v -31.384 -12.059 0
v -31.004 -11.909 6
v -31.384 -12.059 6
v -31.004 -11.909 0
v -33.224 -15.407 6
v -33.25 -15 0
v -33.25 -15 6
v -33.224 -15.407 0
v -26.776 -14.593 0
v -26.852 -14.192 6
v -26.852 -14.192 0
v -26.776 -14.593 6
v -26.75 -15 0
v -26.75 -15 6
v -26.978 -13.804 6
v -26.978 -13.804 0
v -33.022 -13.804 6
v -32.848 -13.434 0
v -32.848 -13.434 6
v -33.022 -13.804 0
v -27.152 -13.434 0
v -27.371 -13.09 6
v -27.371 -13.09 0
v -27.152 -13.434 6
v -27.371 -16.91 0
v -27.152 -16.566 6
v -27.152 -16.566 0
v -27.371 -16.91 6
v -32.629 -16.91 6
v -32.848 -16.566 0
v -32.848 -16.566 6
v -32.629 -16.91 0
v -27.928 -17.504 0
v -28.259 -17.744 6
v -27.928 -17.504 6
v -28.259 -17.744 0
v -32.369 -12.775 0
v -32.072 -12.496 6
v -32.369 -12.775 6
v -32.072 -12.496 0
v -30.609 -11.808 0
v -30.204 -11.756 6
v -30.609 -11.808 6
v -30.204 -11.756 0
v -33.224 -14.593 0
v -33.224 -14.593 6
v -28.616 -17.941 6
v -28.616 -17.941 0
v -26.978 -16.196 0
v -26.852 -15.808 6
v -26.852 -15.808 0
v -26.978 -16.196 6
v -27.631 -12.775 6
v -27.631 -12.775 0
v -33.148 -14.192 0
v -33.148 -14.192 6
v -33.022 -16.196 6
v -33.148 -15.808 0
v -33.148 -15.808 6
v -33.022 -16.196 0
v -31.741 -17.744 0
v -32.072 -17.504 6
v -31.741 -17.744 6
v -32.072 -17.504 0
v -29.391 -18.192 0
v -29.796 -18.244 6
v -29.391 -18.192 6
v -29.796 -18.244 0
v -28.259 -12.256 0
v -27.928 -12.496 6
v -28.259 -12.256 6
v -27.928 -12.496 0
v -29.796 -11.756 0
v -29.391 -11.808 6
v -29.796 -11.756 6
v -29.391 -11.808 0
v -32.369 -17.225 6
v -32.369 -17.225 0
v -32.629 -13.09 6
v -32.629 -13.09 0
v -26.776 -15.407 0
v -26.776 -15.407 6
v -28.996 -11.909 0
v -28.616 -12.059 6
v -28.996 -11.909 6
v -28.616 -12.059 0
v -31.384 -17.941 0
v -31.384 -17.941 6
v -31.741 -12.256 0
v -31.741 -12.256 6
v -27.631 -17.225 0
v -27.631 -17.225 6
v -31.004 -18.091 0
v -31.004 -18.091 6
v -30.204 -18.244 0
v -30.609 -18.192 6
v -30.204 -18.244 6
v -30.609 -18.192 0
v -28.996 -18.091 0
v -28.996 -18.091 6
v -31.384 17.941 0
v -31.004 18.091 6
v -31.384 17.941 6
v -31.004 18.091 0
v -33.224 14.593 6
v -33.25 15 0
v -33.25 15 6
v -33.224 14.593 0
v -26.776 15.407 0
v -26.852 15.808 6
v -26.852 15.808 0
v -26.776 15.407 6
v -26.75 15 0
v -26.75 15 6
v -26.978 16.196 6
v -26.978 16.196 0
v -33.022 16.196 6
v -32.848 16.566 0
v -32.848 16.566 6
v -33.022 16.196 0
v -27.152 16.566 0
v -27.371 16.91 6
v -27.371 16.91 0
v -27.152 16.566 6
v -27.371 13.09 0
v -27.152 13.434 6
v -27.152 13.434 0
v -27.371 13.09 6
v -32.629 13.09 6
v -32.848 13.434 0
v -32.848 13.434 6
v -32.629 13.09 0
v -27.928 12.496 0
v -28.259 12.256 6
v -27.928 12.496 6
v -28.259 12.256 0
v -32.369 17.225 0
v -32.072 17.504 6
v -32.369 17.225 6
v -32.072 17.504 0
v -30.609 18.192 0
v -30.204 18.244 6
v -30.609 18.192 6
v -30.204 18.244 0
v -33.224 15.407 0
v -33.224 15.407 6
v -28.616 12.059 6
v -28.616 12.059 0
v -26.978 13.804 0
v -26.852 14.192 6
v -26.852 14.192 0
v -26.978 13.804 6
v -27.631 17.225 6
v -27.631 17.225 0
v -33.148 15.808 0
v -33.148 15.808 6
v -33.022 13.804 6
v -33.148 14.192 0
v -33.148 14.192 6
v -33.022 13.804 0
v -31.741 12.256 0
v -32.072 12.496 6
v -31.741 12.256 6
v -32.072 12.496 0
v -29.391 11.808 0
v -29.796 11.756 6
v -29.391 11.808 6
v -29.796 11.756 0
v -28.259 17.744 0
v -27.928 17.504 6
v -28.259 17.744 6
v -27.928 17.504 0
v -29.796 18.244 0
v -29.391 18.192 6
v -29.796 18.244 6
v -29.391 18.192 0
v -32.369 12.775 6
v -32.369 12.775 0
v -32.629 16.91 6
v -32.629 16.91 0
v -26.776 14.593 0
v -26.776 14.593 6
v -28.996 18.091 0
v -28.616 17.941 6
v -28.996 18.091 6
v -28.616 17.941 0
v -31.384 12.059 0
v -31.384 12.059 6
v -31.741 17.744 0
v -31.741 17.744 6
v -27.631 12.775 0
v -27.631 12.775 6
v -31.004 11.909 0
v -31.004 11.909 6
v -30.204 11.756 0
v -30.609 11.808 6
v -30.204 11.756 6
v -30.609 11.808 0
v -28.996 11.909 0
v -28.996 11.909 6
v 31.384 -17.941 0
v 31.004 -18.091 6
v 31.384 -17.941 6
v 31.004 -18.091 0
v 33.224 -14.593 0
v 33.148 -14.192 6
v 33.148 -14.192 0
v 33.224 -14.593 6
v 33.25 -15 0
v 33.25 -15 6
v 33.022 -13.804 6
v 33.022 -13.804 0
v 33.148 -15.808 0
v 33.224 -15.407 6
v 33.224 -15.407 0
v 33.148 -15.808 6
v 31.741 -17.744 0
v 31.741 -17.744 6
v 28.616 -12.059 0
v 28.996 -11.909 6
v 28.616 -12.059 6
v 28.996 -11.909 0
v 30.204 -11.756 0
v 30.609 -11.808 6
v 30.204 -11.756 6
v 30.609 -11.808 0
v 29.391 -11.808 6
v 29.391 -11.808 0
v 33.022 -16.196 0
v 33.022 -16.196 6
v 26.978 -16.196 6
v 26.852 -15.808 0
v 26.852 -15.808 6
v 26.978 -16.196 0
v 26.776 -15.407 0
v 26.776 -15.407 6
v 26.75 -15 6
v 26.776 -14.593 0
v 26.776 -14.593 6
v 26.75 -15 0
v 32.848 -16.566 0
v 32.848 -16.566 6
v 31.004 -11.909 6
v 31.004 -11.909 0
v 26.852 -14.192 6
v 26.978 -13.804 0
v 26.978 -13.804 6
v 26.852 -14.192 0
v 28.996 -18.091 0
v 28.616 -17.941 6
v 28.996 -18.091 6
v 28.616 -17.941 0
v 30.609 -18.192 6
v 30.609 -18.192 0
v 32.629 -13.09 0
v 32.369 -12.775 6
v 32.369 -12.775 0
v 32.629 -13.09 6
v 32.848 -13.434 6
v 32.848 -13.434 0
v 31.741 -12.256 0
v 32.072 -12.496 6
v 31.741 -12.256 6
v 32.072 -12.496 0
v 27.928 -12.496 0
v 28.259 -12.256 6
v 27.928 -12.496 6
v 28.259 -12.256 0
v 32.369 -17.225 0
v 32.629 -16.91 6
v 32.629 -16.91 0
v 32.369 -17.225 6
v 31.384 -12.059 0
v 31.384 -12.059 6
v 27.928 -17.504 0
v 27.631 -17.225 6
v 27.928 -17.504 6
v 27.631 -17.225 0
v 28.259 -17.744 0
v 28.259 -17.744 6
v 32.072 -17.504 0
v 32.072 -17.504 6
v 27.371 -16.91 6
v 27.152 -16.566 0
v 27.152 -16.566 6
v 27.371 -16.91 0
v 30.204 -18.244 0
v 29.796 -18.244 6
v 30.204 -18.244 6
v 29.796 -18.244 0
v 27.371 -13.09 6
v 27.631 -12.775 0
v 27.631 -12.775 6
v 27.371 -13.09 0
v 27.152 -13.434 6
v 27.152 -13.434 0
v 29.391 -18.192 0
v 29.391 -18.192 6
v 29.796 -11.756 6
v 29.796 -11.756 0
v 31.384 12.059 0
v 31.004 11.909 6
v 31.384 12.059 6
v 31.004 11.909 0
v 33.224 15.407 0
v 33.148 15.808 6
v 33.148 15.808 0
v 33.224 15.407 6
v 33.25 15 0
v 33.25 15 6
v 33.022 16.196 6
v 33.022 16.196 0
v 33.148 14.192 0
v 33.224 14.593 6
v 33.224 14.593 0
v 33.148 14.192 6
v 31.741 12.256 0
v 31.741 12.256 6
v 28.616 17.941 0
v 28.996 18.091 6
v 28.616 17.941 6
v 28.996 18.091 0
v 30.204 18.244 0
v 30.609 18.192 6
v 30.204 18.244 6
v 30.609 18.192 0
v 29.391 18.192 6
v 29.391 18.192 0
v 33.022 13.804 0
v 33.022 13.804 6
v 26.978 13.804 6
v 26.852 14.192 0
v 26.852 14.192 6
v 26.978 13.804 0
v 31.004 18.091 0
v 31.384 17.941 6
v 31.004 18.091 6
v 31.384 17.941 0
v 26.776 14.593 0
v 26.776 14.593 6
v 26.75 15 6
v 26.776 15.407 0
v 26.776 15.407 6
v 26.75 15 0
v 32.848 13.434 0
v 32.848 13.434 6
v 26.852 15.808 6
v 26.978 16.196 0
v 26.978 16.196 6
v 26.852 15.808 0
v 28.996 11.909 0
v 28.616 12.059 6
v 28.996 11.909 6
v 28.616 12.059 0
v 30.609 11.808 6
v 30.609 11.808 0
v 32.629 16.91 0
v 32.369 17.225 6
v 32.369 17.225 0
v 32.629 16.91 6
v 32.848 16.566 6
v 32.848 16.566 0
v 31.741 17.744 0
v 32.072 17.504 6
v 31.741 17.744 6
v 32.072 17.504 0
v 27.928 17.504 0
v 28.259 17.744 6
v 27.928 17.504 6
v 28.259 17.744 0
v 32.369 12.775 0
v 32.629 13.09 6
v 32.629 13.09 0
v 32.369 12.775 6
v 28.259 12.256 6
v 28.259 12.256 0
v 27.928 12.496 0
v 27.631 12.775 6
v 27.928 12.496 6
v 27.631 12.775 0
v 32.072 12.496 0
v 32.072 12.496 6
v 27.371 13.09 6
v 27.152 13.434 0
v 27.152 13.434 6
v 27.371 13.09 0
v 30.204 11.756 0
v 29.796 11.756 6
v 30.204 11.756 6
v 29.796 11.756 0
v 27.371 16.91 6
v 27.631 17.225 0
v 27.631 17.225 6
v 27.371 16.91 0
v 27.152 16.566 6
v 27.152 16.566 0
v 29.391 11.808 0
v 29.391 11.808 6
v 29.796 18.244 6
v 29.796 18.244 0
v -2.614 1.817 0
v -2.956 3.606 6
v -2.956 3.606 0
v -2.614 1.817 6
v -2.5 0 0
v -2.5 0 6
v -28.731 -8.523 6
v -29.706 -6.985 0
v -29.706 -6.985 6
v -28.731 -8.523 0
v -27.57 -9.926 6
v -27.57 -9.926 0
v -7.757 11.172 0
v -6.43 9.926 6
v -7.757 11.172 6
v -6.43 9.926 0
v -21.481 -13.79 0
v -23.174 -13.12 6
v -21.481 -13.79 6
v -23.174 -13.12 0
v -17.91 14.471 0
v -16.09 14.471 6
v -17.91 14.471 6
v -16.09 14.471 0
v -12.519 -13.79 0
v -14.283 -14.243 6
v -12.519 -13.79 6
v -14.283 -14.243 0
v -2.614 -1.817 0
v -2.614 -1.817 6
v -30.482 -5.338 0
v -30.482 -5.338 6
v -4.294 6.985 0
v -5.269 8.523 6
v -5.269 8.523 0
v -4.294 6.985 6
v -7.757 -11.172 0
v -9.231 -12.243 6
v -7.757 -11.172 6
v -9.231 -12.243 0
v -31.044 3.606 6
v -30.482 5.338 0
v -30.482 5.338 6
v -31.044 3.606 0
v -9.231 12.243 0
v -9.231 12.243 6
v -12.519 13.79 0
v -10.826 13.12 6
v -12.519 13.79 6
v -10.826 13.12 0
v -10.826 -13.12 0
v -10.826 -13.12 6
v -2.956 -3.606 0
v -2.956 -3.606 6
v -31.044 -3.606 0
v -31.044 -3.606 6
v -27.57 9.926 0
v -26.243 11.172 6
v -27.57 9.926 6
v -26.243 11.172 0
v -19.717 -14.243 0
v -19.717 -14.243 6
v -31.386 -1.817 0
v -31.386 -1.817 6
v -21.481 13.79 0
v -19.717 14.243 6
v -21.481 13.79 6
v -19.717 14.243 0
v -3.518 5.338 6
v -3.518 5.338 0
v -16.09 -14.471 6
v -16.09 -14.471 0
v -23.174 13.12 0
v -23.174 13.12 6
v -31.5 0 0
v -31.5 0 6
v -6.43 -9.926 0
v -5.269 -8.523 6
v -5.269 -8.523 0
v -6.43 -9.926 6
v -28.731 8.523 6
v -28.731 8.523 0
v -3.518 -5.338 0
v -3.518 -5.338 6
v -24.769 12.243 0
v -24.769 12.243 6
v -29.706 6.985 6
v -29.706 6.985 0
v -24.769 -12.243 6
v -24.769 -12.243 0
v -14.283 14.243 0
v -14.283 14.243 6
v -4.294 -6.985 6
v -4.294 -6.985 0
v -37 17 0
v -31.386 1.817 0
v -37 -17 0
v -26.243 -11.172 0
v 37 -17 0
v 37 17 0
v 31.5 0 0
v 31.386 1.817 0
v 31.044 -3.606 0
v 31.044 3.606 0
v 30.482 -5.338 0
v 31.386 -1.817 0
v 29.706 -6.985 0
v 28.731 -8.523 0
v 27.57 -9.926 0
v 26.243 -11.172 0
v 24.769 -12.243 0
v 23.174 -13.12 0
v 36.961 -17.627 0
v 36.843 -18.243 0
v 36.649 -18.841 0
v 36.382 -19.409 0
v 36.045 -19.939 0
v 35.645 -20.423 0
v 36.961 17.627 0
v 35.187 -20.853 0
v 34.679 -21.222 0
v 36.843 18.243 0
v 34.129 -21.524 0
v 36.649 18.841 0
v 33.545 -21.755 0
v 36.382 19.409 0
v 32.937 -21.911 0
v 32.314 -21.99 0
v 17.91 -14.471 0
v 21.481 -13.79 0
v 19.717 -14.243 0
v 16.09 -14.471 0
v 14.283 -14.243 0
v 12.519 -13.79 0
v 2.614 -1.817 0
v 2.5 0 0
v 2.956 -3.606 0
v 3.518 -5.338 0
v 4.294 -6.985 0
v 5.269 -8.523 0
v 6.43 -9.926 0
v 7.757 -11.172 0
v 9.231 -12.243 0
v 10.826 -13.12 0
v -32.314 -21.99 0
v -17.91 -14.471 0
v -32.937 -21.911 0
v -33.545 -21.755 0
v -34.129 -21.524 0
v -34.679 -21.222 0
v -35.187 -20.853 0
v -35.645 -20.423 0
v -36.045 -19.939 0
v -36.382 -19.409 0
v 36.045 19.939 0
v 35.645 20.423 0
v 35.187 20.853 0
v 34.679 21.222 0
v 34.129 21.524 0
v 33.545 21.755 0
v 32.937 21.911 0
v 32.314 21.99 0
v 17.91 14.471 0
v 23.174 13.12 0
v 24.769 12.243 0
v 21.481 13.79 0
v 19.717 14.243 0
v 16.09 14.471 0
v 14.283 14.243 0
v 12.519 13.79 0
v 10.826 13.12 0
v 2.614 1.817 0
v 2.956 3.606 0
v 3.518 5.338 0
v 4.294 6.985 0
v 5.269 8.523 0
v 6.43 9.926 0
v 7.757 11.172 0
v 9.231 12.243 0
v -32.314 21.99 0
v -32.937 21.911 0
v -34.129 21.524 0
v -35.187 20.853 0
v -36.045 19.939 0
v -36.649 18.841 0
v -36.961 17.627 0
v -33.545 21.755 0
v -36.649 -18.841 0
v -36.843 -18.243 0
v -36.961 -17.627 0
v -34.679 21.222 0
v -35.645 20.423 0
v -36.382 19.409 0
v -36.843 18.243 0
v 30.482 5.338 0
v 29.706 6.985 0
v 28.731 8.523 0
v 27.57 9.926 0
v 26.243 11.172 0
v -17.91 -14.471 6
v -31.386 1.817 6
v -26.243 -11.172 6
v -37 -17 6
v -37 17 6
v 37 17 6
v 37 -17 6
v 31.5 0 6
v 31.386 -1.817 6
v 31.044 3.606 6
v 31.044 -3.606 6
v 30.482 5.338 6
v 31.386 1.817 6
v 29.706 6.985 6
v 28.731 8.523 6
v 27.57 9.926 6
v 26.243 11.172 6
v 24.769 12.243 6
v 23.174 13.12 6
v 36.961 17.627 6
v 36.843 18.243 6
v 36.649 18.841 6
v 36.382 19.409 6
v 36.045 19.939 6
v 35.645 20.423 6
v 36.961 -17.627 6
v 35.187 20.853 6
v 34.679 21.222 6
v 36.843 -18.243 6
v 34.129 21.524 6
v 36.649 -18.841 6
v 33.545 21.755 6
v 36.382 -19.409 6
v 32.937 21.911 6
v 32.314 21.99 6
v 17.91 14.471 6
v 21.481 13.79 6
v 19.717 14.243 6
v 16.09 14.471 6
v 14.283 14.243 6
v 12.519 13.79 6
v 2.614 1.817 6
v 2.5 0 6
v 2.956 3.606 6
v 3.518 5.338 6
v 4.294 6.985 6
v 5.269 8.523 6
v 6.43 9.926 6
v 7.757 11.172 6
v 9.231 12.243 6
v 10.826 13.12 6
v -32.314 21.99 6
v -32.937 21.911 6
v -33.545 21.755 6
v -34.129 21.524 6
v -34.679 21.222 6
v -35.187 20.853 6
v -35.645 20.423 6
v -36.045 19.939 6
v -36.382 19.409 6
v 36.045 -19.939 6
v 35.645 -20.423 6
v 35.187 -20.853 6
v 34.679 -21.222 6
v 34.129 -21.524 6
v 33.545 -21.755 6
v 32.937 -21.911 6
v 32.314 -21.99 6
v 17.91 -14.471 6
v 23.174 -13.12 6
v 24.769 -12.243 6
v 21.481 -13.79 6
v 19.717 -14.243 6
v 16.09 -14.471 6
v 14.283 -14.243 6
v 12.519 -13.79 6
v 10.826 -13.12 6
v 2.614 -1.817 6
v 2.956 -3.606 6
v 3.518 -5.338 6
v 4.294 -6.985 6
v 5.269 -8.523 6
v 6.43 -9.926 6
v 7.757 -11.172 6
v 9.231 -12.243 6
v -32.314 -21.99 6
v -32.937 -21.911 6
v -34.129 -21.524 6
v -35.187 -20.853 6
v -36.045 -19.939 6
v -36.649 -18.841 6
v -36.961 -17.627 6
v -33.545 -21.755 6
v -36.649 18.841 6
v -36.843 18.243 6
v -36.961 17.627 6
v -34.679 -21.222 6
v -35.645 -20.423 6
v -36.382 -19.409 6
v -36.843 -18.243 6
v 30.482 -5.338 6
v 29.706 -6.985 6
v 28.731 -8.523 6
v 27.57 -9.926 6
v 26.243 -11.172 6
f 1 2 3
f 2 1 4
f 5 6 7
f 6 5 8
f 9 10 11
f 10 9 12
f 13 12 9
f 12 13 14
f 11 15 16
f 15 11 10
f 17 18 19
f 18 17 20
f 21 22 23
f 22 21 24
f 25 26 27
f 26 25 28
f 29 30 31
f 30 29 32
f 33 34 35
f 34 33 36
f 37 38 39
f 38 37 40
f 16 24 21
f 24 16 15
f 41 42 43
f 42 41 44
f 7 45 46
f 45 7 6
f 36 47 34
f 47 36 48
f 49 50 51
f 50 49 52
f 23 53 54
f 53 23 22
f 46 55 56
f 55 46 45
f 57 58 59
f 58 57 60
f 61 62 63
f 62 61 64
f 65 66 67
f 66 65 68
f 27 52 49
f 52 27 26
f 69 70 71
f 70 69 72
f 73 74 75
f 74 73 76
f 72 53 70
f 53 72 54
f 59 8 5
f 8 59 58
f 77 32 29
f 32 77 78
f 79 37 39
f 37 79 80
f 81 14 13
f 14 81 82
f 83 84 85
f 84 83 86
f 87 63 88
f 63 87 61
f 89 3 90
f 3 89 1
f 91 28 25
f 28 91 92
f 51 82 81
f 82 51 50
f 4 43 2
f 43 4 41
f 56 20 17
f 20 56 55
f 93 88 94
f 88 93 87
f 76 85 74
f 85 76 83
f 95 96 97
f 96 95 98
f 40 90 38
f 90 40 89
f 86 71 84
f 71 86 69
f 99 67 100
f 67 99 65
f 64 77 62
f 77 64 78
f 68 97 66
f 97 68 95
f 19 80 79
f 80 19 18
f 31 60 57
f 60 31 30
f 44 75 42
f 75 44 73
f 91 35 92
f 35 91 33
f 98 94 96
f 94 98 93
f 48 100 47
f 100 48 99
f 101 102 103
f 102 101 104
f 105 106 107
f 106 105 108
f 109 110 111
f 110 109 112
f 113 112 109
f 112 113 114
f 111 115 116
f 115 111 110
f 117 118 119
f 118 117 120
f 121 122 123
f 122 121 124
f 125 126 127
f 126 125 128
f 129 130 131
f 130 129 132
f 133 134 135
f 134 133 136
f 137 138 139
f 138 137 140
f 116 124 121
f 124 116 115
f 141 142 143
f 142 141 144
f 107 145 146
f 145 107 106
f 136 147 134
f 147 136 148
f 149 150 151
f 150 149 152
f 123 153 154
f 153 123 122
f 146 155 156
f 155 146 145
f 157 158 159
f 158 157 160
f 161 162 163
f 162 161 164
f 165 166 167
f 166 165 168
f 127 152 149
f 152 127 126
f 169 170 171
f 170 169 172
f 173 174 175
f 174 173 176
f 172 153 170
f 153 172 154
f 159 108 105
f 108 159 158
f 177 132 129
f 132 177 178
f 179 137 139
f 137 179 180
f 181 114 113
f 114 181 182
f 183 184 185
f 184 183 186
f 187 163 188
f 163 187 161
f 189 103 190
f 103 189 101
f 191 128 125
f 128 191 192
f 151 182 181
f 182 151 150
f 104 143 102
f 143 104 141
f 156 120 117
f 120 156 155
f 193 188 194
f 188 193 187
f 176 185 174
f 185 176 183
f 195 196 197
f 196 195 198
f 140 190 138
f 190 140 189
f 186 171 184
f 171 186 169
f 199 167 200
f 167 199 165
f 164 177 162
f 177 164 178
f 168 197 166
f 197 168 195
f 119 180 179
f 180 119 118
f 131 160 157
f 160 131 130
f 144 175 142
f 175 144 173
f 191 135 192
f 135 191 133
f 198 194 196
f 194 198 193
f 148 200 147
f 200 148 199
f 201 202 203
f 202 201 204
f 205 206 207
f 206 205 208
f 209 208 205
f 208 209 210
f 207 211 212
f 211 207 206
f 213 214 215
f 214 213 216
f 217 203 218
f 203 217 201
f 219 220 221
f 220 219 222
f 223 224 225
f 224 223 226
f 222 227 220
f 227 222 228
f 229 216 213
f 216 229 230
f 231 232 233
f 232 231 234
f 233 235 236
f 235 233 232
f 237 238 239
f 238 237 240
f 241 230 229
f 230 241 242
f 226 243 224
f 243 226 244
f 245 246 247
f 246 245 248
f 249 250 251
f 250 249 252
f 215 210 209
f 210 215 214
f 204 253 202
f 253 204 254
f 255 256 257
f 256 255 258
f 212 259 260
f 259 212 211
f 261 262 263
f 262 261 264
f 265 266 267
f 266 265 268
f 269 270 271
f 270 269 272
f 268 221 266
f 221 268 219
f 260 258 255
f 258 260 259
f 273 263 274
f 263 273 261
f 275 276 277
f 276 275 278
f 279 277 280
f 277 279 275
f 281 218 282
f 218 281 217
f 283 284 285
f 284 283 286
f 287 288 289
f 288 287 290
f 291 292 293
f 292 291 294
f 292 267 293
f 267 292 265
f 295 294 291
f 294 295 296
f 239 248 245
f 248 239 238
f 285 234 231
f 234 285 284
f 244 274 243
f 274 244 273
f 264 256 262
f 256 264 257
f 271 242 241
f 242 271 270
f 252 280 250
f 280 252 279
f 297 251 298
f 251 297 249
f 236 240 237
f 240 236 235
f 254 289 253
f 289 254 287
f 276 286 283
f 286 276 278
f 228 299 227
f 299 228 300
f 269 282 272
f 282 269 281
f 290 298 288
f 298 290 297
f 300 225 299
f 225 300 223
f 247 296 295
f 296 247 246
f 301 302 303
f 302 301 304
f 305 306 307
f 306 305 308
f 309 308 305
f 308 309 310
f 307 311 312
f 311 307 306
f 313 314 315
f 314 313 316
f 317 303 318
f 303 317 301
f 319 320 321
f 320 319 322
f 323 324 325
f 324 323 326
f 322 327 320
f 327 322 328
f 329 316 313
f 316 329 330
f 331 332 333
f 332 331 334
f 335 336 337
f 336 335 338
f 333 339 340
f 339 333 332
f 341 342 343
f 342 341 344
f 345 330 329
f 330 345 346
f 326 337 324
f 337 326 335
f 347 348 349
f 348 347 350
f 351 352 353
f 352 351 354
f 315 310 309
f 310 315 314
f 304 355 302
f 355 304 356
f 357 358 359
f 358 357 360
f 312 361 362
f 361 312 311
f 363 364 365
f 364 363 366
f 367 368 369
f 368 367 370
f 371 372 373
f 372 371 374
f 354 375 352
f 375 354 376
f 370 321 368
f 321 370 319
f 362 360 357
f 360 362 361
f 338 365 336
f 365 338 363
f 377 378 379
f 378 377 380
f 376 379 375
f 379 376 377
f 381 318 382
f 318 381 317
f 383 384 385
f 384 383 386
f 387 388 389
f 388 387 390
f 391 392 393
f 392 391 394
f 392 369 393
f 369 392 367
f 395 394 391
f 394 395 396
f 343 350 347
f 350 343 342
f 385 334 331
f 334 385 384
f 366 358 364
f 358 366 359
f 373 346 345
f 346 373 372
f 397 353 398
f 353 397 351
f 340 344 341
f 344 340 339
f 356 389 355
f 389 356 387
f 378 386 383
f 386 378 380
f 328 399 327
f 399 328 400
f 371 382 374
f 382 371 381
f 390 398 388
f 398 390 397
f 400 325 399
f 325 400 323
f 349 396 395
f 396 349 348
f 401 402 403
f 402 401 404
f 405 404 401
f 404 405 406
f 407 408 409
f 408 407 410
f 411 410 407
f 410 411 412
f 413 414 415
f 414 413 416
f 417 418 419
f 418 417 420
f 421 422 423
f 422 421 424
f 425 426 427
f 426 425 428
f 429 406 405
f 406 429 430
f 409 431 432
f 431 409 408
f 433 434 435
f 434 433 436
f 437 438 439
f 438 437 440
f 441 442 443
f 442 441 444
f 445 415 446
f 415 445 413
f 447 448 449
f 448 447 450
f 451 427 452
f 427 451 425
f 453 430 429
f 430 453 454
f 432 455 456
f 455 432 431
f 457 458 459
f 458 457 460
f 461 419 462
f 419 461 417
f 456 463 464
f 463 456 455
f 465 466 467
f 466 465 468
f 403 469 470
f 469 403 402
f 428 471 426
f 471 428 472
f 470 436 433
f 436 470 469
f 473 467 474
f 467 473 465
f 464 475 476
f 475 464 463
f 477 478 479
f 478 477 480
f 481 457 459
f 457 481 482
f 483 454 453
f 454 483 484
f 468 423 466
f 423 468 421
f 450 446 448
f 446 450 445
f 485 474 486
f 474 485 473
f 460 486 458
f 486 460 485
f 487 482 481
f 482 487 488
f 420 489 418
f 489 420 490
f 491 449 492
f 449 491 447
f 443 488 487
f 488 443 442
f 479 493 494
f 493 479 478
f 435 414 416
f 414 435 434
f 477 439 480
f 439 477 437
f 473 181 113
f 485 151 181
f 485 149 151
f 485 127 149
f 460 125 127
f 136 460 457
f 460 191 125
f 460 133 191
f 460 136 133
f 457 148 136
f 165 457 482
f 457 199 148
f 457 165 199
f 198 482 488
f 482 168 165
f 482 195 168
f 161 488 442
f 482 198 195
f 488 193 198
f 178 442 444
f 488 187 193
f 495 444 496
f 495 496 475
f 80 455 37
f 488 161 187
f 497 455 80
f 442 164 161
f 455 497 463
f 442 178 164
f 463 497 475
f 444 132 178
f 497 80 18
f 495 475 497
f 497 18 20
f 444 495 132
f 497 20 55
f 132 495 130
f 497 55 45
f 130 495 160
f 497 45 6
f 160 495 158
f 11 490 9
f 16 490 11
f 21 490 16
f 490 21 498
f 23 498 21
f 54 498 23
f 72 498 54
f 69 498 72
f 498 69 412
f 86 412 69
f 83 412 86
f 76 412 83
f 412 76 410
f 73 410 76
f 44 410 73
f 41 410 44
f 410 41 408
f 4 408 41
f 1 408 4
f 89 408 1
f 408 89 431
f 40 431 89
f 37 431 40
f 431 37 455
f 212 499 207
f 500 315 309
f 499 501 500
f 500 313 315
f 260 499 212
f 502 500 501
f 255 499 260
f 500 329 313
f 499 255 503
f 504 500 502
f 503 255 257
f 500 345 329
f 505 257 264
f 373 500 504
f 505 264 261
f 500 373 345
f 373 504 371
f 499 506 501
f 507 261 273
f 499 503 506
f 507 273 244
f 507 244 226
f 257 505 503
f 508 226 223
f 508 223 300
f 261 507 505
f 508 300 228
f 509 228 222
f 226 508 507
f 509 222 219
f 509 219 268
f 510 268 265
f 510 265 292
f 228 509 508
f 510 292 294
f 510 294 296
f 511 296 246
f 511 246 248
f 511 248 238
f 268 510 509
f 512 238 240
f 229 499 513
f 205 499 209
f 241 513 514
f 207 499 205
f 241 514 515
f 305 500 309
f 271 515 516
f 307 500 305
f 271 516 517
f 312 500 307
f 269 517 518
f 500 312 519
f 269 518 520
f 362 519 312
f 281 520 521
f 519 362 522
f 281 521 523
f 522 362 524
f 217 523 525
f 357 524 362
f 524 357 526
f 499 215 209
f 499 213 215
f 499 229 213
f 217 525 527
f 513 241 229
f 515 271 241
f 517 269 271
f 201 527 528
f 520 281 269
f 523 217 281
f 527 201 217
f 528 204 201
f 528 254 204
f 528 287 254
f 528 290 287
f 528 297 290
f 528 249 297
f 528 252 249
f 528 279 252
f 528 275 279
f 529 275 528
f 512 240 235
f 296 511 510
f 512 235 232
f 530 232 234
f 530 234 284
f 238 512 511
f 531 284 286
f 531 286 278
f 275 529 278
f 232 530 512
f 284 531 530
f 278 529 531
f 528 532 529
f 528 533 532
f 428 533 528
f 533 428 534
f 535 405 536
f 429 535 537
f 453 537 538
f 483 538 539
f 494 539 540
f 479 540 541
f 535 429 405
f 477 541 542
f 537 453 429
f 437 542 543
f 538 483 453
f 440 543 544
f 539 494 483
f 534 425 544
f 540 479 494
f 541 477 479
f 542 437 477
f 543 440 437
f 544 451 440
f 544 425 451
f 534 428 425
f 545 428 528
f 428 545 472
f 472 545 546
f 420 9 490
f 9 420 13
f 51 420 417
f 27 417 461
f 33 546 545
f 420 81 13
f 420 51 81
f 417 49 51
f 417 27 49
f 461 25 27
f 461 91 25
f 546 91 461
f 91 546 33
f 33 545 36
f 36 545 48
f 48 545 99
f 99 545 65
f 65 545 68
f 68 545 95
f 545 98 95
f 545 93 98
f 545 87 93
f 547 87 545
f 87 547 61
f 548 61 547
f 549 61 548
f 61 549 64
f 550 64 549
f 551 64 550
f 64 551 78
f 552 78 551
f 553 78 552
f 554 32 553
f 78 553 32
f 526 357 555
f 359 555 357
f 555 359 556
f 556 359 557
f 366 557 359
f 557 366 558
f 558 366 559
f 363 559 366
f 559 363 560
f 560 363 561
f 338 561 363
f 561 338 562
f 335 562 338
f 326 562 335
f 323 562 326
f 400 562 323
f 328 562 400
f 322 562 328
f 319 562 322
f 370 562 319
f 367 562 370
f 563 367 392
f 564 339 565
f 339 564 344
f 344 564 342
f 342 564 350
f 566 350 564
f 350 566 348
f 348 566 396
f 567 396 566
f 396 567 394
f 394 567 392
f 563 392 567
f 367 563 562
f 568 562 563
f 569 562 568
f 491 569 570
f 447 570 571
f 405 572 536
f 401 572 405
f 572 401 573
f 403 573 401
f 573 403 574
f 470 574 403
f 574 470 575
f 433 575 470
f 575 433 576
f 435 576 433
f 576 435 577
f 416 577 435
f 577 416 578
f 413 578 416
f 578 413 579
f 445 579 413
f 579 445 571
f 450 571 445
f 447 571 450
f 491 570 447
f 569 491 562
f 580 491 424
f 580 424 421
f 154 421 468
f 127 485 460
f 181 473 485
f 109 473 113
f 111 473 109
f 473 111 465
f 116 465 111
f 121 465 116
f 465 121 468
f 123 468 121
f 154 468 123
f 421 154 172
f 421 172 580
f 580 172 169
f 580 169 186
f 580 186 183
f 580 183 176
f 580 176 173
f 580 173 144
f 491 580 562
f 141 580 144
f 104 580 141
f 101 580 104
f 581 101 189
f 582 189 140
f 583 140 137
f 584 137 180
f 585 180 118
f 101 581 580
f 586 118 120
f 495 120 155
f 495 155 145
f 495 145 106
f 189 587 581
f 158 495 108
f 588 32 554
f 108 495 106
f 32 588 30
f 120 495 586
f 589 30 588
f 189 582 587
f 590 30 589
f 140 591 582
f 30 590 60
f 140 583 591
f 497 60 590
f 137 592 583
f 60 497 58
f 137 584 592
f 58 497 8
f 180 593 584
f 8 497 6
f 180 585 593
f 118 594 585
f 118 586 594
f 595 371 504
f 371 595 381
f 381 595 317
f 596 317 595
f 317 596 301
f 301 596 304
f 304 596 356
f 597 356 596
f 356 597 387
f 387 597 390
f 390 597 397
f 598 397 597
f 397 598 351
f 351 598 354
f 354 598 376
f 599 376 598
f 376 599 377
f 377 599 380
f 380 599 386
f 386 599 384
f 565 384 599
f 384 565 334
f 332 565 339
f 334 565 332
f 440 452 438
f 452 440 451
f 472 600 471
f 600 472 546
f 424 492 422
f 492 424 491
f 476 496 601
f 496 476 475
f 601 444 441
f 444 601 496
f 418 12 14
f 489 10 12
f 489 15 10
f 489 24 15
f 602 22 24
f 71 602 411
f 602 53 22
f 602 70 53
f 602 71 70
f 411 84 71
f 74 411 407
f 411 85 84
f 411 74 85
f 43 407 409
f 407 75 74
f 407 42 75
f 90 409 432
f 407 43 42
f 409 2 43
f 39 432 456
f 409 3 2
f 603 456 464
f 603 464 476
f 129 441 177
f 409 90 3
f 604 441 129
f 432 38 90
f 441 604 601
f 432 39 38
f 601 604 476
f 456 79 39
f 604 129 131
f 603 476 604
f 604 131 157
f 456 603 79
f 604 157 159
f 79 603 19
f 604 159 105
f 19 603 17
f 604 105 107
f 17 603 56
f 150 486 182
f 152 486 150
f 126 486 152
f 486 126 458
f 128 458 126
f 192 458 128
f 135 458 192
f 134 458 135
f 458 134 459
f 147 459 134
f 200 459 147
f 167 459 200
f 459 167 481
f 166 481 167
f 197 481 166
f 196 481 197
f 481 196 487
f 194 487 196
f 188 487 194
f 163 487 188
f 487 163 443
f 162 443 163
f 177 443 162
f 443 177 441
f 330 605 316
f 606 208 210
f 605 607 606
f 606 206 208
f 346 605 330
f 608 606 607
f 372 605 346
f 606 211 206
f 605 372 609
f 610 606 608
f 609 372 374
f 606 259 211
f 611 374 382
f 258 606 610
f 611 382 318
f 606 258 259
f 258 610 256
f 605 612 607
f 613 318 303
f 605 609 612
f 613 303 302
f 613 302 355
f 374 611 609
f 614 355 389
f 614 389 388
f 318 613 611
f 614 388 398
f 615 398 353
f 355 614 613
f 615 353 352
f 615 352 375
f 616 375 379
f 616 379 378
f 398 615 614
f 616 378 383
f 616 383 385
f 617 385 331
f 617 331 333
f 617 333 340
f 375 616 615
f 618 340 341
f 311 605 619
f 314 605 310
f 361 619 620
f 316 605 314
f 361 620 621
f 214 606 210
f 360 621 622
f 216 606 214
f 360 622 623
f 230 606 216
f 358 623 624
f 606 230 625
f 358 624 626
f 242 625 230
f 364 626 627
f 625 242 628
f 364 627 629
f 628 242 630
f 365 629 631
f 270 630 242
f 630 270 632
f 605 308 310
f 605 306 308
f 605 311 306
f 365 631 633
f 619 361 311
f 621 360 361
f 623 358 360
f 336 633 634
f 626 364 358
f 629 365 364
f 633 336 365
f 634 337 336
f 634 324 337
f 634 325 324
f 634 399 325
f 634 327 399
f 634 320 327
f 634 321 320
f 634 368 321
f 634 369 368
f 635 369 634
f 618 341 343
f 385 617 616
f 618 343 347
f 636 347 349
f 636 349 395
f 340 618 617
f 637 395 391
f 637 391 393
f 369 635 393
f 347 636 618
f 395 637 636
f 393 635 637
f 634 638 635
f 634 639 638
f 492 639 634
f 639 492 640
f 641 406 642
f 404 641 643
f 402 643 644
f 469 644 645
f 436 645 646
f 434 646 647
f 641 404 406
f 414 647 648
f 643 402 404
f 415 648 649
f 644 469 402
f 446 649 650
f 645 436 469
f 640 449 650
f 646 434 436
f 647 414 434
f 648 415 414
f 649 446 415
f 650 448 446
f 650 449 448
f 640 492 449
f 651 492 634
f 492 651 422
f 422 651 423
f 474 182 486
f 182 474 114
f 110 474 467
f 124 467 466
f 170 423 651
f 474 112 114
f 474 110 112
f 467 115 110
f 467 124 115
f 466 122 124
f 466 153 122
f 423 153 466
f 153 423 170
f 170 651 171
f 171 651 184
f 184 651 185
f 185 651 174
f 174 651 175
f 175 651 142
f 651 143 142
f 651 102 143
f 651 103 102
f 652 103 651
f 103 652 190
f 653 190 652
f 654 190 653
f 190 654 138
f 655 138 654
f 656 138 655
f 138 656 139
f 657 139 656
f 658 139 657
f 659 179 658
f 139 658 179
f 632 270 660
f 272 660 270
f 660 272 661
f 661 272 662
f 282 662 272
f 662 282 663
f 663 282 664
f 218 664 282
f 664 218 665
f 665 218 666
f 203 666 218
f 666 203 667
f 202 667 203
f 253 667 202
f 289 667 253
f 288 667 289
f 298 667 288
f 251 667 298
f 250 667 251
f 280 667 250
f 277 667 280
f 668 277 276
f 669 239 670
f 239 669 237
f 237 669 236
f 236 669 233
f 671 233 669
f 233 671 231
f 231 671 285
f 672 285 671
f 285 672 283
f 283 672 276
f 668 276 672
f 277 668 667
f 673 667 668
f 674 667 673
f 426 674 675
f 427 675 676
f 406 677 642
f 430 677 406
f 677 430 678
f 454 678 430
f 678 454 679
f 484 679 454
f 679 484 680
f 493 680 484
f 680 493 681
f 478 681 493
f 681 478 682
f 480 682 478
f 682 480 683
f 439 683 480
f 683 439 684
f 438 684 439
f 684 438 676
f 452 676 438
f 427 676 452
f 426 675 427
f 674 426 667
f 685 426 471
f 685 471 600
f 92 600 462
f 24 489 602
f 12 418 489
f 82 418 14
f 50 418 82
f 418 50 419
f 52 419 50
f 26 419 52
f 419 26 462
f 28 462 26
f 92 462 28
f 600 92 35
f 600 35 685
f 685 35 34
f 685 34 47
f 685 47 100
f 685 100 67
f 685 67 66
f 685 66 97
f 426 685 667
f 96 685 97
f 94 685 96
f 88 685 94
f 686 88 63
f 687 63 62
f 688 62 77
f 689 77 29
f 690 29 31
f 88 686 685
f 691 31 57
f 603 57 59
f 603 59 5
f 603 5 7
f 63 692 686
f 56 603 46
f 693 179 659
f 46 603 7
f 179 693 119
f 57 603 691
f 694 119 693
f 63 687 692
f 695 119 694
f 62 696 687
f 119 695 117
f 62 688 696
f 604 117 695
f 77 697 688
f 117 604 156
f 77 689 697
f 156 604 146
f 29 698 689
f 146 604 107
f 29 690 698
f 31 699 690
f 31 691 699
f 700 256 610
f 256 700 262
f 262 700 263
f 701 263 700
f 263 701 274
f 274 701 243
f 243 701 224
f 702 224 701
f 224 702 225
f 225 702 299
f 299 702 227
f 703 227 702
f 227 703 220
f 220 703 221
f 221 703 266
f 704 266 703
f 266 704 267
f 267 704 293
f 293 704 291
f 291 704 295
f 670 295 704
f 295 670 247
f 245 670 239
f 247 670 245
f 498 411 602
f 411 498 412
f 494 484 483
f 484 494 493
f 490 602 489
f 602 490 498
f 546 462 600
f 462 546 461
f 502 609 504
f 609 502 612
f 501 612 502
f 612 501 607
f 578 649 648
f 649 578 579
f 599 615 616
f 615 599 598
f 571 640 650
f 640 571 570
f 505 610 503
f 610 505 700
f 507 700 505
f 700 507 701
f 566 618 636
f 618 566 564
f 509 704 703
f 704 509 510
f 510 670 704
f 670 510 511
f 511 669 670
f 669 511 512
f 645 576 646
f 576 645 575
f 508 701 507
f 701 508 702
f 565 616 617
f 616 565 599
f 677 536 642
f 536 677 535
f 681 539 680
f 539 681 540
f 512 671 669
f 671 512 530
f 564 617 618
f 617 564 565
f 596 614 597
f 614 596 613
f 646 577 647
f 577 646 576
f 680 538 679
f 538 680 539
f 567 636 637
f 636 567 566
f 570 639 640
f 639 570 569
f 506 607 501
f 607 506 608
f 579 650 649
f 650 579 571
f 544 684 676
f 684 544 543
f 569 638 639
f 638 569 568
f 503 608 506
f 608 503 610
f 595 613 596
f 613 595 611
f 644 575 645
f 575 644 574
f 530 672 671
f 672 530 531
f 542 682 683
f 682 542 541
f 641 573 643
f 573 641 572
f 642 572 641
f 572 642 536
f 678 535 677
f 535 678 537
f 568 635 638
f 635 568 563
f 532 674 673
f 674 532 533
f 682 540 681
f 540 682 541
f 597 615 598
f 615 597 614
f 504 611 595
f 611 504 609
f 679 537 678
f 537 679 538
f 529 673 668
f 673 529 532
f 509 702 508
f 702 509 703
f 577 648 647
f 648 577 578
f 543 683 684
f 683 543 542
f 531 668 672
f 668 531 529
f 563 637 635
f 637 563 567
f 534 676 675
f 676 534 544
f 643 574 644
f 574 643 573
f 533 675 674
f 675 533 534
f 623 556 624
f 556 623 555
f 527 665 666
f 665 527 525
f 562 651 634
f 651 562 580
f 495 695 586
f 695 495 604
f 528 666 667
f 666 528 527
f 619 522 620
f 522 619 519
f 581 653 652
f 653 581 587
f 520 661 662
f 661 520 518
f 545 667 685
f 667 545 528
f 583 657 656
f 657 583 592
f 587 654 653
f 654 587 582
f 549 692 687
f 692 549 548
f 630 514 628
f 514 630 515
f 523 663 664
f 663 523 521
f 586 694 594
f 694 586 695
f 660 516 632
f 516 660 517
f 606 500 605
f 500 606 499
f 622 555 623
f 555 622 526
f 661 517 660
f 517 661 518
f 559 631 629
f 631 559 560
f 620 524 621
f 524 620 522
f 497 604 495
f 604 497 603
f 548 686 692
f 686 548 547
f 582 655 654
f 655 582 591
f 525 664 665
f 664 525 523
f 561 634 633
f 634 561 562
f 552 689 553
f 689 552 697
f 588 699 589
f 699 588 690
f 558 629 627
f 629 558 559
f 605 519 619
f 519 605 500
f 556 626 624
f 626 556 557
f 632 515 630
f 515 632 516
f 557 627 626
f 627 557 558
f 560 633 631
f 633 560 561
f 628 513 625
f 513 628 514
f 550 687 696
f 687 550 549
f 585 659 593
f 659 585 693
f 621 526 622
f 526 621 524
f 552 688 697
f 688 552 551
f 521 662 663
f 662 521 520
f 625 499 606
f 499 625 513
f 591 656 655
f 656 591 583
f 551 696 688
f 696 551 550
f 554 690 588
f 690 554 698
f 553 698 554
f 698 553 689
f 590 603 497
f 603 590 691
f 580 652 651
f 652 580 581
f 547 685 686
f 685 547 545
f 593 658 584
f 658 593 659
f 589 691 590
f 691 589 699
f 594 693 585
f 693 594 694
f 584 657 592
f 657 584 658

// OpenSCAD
$fn = 50;


difference() {
	union() {
		hull() {
			translate(v = [-32.0000000000, 17.0000000000, 0]) {
				cylinder(h = 6, r = 5);
			}
			translate(v = [32.0000000000, 17.0000000000, 0]) {
				cylinder(h = 6, r = 5);
			}
			translate(v = [-32.0000000000, -17.0000000000, 0]) {
				cylinder(h = 6, r = 5);
			}
			translate(v = [32.0000000000, -17.0000000000, 0]) {
				cylinder(h = 6, r = 5);
			}
		}
	}
	union() {
		#translate(v = [-30.0000000000, -15.0000000000, -100.0000000000]) {
			cylinder(h = 200, r = 3.2500000000);
		}
		#translate(v = [-30.0000000000, 15.0000000000, -100.0000000000]) {
			cylinder(h = 200, r = 3.2500000000);
		}
		#translate(v = [30.0000000000, -15.0000000000, -100.0000000000]) {
			cylinder(h = 200, r = 3.2500000000);
		}
		#translate(v = [30.0000000000, 15.0000000000, -100.0000000000]) {
			cylinder(h = 200, r = 3.2500000000);
		}
		#translate(v = [-17.0000000000, 0, 0]) {
			cylinder(h = 6, r = 14.5000000000);
		}
		#translate(v = [17.0000000000, 0, 0]) {
			cylinder(h = 6, r = 14.5000000000);
		}
	}
}
